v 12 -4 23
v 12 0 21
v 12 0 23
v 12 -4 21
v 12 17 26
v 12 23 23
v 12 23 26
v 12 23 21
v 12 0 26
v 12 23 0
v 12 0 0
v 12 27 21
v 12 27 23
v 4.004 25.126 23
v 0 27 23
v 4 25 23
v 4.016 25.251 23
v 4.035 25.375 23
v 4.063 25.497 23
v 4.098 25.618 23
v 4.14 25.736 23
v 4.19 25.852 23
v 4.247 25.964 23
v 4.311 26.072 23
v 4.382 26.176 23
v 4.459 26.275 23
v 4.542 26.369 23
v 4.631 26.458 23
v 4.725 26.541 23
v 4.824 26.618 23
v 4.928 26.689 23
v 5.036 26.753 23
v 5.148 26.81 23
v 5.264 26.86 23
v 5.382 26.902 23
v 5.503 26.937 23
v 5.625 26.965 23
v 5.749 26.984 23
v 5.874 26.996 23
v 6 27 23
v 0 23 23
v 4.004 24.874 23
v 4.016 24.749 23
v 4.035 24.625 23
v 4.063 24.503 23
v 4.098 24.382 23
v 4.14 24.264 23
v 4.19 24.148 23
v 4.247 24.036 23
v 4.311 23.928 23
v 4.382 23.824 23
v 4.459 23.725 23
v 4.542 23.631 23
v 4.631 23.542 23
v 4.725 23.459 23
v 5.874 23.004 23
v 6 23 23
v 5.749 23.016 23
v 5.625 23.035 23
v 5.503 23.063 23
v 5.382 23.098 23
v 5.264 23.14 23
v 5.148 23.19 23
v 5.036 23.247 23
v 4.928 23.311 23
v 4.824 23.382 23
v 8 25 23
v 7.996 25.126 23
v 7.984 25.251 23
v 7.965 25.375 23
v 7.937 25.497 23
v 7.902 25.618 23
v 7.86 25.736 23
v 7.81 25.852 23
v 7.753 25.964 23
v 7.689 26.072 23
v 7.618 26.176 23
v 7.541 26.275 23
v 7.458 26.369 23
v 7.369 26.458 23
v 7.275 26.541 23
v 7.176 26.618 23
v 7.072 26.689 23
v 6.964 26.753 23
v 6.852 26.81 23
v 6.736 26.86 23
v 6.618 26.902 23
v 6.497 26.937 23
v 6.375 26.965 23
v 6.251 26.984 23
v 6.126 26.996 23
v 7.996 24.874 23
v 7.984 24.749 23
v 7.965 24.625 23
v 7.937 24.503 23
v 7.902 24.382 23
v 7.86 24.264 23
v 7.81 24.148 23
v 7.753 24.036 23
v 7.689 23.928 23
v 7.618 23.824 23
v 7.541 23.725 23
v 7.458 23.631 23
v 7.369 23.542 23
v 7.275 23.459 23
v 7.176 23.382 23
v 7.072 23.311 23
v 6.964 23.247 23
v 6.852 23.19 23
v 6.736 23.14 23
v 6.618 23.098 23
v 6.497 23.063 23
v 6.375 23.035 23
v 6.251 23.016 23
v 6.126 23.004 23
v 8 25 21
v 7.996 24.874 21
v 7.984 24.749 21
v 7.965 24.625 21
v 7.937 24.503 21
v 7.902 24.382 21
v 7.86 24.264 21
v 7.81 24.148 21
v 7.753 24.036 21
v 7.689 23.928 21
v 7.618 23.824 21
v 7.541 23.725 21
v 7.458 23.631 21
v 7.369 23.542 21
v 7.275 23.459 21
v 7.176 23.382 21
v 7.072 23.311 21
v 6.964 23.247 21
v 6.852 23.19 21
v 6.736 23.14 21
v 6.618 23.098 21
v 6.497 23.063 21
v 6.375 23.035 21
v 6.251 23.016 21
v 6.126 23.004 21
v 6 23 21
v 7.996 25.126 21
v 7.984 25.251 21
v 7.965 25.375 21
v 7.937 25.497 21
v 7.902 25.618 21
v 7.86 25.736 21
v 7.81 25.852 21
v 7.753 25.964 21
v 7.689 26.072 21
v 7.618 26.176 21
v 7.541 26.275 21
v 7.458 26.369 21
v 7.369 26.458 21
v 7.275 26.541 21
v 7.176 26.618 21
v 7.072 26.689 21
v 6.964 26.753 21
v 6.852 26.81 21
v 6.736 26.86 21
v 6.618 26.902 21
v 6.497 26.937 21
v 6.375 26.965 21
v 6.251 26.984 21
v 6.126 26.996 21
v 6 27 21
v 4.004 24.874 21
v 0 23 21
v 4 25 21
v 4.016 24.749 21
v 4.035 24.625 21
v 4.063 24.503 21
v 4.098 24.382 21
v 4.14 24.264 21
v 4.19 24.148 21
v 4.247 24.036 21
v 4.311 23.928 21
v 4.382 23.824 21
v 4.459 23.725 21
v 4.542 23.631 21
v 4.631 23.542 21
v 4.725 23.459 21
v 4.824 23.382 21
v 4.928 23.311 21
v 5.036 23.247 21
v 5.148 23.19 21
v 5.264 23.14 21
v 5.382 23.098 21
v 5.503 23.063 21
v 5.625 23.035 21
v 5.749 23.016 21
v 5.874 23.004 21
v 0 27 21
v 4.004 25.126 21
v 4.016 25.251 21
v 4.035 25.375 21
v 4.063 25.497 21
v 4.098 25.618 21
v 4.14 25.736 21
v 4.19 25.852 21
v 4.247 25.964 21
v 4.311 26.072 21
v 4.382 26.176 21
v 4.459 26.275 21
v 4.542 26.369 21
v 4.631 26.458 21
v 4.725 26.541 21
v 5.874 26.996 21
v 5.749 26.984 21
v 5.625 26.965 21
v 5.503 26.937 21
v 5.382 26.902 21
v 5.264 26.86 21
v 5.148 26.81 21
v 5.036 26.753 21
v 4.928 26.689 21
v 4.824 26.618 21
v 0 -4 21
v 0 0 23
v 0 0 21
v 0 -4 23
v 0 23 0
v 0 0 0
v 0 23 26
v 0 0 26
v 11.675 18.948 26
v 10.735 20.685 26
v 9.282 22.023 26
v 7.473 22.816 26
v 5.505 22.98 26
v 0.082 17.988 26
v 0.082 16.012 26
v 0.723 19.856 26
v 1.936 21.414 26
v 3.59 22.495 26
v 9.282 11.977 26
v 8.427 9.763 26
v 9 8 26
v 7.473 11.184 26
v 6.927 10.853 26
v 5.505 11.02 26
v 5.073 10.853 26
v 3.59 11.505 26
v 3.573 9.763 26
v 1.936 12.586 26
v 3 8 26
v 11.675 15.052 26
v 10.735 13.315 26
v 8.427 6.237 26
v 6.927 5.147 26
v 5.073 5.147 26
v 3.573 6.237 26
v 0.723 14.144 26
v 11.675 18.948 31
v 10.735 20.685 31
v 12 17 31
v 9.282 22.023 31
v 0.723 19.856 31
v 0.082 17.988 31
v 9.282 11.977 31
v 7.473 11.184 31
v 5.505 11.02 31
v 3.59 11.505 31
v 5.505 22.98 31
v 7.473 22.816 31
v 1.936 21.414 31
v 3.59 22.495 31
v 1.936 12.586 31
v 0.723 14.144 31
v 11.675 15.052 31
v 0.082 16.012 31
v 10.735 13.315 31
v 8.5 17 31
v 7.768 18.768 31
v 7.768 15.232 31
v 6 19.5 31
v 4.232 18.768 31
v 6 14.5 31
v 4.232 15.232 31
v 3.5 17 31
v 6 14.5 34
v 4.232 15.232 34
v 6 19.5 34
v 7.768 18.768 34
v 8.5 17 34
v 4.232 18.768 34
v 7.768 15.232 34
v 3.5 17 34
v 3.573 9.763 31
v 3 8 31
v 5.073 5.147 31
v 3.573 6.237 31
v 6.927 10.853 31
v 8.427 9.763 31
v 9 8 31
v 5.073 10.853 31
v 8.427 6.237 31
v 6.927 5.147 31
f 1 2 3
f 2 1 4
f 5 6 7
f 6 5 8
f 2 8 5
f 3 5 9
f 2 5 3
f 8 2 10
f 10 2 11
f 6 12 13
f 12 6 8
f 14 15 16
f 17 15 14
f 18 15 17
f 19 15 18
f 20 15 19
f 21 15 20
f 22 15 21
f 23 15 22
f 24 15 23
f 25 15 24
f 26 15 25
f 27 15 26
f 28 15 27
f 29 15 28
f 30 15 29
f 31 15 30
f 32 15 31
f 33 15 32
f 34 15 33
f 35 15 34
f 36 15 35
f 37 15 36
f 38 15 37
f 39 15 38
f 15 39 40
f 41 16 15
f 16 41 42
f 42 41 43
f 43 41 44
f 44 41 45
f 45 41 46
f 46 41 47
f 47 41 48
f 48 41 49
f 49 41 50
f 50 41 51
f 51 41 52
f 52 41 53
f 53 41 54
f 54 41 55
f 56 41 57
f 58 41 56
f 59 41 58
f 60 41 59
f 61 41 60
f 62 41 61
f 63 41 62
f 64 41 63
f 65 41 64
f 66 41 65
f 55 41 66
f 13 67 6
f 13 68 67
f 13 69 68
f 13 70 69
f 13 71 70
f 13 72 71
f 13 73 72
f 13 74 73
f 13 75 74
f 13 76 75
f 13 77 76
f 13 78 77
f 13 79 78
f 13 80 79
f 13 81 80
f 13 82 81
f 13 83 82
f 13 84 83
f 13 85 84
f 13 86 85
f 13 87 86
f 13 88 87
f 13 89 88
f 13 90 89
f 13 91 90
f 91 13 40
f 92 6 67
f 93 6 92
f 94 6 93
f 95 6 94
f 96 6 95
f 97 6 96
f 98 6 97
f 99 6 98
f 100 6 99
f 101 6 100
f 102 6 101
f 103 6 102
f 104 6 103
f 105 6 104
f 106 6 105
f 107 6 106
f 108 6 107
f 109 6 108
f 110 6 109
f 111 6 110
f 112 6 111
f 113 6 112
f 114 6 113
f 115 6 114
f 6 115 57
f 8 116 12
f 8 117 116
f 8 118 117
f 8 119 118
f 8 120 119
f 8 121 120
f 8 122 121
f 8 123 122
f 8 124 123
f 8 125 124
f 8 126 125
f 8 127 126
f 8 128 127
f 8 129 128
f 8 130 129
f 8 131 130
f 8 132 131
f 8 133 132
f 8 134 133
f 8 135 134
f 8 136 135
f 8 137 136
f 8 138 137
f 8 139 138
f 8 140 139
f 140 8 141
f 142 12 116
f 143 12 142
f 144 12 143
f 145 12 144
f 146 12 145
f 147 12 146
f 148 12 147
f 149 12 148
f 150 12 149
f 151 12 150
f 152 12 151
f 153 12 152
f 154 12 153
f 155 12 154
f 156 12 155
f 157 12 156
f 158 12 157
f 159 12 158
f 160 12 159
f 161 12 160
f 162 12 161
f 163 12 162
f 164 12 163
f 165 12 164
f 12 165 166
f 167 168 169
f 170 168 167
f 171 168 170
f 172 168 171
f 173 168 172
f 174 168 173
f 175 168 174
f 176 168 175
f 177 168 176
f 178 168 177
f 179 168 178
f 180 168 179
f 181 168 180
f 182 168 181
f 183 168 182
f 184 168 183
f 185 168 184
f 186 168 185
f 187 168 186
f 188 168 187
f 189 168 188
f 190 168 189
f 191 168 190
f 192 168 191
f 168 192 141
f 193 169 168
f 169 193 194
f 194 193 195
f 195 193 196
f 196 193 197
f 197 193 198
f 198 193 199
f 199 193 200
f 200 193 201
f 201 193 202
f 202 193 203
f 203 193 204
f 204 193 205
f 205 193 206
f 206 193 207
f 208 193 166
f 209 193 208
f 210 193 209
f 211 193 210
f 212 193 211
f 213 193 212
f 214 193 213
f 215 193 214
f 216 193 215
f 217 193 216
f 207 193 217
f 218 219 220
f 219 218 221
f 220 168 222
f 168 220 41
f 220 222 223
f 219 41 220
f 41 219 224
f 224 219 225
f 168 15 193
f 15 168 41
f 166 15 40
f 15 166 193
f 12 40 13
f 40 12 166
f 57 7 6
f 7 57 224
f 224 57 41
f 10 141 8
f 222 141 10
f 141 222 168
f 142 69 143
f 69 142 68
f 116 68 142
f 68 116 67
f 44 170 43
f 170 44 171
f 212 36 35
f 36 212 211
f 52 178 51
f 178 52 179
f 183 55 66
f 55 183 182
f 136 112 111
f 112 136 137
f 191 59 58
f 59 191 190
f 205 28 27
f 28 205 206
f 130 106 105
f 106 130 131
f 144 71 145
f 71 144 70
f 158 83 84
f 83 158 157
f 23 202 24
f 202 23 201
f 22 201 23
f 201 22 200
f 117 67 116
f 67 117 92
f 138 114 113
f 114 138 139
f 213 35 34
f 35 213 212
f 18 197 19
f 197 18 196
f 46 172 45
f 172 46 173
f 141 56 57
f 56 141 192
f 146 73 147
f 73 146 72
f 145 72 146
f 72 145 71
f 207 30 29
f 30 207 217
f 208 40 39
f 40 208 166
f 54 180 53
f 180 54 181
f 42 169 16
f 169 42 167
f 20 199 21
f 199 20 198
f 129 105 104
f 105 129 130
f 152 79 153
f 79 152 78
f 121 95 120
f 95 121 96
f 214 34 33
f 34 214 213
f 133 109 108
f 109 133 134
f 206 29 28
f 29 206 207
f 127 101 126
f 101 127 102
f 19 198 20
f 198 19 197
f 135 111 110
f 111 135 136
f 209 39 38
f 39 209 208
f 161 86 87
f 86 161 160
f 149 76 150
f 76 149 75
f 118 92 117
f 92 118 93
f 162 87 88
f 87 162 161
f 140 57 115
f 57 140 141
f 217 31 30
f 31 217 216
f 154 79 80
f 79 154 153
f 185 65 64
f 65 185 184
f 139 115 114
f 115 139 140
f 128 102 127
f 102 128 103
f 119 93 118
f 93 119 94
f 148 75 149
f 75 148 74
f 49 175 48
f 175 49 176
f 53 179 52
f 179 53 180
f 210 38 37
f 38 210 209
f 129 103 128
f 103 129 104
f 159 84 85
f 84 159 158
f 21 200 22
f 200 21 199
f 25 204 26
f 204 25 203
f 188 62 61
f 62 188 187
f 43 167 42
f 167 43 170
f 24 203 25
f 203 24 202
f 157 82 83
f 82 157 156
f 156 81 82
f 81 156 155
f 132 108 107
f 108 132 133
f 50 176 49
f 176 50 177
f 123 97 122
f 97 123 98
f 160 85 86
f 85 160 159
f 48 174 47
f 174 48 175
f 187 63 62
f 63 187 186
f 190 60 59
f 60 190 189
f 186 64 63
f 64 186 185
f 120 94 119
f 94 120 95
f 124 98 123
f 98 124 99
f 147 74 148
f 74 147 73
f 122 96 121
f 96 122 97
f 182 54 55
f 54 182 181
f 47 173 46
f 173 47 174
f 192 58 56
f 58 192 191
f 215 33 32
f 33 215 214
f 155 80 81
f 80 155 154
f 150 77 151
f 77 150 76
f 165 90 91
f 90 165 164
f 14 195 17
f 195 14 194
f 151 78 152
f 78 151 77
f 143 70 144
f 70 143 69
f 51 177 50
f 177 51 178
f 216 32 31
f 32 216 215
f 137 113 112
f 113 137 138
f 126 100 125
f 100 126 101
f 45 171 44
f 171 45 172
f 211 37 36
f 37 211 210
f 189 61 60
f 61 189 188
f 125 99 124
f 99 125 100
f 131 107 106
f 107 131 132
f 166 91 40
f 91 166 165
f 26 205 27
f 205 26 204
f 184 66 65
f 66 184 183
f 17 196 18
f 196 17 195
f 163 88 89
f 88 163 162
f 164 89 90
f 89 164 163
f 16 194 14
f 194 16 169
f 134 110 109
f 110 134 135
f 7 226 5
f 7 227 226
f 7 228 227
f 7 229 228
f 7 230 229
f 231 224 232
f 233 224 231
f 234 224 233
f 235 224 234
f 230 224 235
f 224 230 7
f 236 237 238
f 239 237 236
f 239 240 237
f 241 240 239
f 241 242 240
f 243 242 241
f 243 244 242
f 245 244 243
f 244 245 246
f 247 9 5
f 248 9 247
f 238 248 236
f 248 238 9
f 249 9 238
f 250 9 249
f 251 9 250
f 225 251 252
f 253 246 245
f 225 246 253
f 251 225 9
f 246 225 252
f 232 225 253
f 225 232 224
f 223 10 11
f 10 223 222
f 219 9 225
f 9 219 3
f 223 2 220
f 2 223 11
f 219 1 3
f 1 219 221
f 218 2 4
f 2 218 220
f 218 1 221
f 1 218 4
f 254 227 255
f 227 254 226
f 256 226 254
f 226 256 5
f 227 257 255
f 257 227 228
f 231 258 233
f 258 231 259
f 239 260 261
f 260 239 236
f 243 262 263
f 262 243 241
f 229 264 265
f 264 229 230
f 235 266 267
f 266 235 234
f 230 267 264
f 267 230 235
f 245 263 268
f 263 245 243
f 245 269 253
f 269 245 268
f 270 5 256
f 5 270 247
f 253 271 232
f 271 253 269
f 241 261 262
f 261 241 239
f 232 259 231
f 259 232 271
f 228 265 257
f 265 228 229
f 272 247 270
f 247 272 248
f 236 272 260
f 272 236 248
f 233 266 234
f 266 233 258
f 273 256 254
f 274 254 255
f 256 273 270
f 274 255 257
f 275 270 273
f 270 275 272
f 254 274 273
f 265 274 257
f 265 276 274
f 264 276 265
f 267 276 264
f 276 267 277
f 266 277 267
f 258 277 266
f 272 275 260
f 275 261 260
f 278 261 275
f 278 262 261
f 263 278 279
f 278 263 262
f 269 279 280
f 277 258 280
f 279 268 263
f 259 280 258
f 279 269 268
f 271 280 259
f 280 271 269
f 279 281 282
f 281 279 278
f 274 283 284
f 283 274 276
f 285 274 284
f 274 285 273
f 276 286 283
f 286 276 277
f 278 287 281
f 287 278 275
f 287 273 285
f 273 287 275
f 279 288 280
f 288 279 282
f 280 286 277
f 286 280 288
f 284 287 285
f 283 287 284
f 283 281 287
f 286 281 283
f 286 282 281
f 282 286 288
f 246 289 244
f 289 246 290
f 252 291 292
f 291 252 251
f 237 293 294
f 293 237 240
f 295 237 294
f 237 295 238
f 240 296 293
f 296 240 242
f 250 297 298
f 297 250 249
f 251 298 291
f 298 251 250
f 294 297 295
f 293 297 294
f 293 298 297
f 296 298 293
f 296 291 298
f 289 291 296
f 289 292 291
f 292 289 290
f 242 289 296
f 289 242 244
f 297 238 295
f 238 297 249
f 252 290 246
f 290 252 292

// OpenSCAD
/*
 ___   ___        ___       __  ___   ___                            
|   |=|_.'   .'|=|_.'  .'|=|  ||   | |   |  .'|=|`.                  
`.  |      .'  |  ___.'  | |  ||   | |   |.'  | |  `.                
  `.|=|`.  |   |=|_.'|   |=|.' |   | |   ||   | |   |                
 ___  |  `.|   |  ___|   |  |`.`.  | |  .'`.  | |  .'                
 `._|=|___||___|=|_.'|___|  |_|  `.|=|.'    `.|=|.'                  
                                                                     
       _        ___  ___   ___     ___                 ___ ___   ___ 
  .'|=| `.  .'|`._|=|   |=|_.'.'|=|_.'  .'| |`.   .'|=|_.'|   |=|_.' 
.'  | | .'.'  |     |   |   .'  |     .'  | |  `.'  |  ___`.  |      
|   |=|'. |   |     |   |   |   |     |   |=|   |   |=|_.'  `.|=|`.  
|   | |  ||   |     `.  |   `.  |  ___|   | |   |   |  ___ ___  |  `.
|___|=|_.'|___|       `.|     `.|=|_.'|___| |___|___|=|_.' `._|=|___|
                                                                     
*/

/*~*~*~*~*~*~*~*~*~*~*~*~Servo Design~*~*~*~*~*~*~*~*~*~*~*~*/

/* Description*/
//This code adapted from work protected by the Collective Commons Attribution-ShareAlike 3.0 Unported license http://creativecommons.org/licenses/by-sa/3.0/legalcode. 
//I made changes to this work in order to accurately reflect the servo motors used in the RaspberrySpy project.
epsilon=.001;

module miniservo(base_x, base_y, base_z, 
	fix_offset, fix_y, fix_z,
	cyl_height, cyl_radius, cyl_offset,
	axe_height, axe_radius) {
	color("LightBlue") cube([base_x, base_y, base_z]);
	color("LightBlue") translate([0, -fix_y, base_z - fix_offset]) 
		cube([base_x, fix_y, fix_z]);
	color("LightBlue") translate([0, base_y, base_z - fix_offset]) 	
difference(){
	cube([base_x, fix_y, fix_z]);
	translate([6,2,0]) cylinder(r=2,h=fix_z+1, $fn=100);

}

	color("grey") translate([base_x/2, base_y-cyl_offset, base_z]) 
		cylinder(cyl_height, cyl_radius, cyl_radius);
	color("White") translate([base_x/2, base_y-cyl_offset, base_z+cyl_height]) 
		cylinder(axe_height, axe_radius, axe_radius);
}

module TG9() {
	base_x = 12; base_y = 23; base_z = 26;
	fix_offset = 5; fix_y = 4; fix_z = 2;
	cyl_height = 5; cyl_radius = 6;	cyl_offset = 6;
	smallcyl_radius = 3; smallcyl_offset = 15;
	axe_height = 3; axe_radius = 2.5;
	union() {
		miniservo(base_x, base_y, base_z,
		 fix_offset, fix_y, fix_z,
		 cyl_height, cyl_radius, cyl_offset,
		 axe_height, axe_radius);
		
		translate([base_x/2, base_y-smallcyl_offset,base_z]) color("Blue") cylinder(cyl_height, smallcyl_radius, smallcyl_radius);
	}
}

TG9(); //Generate servo
